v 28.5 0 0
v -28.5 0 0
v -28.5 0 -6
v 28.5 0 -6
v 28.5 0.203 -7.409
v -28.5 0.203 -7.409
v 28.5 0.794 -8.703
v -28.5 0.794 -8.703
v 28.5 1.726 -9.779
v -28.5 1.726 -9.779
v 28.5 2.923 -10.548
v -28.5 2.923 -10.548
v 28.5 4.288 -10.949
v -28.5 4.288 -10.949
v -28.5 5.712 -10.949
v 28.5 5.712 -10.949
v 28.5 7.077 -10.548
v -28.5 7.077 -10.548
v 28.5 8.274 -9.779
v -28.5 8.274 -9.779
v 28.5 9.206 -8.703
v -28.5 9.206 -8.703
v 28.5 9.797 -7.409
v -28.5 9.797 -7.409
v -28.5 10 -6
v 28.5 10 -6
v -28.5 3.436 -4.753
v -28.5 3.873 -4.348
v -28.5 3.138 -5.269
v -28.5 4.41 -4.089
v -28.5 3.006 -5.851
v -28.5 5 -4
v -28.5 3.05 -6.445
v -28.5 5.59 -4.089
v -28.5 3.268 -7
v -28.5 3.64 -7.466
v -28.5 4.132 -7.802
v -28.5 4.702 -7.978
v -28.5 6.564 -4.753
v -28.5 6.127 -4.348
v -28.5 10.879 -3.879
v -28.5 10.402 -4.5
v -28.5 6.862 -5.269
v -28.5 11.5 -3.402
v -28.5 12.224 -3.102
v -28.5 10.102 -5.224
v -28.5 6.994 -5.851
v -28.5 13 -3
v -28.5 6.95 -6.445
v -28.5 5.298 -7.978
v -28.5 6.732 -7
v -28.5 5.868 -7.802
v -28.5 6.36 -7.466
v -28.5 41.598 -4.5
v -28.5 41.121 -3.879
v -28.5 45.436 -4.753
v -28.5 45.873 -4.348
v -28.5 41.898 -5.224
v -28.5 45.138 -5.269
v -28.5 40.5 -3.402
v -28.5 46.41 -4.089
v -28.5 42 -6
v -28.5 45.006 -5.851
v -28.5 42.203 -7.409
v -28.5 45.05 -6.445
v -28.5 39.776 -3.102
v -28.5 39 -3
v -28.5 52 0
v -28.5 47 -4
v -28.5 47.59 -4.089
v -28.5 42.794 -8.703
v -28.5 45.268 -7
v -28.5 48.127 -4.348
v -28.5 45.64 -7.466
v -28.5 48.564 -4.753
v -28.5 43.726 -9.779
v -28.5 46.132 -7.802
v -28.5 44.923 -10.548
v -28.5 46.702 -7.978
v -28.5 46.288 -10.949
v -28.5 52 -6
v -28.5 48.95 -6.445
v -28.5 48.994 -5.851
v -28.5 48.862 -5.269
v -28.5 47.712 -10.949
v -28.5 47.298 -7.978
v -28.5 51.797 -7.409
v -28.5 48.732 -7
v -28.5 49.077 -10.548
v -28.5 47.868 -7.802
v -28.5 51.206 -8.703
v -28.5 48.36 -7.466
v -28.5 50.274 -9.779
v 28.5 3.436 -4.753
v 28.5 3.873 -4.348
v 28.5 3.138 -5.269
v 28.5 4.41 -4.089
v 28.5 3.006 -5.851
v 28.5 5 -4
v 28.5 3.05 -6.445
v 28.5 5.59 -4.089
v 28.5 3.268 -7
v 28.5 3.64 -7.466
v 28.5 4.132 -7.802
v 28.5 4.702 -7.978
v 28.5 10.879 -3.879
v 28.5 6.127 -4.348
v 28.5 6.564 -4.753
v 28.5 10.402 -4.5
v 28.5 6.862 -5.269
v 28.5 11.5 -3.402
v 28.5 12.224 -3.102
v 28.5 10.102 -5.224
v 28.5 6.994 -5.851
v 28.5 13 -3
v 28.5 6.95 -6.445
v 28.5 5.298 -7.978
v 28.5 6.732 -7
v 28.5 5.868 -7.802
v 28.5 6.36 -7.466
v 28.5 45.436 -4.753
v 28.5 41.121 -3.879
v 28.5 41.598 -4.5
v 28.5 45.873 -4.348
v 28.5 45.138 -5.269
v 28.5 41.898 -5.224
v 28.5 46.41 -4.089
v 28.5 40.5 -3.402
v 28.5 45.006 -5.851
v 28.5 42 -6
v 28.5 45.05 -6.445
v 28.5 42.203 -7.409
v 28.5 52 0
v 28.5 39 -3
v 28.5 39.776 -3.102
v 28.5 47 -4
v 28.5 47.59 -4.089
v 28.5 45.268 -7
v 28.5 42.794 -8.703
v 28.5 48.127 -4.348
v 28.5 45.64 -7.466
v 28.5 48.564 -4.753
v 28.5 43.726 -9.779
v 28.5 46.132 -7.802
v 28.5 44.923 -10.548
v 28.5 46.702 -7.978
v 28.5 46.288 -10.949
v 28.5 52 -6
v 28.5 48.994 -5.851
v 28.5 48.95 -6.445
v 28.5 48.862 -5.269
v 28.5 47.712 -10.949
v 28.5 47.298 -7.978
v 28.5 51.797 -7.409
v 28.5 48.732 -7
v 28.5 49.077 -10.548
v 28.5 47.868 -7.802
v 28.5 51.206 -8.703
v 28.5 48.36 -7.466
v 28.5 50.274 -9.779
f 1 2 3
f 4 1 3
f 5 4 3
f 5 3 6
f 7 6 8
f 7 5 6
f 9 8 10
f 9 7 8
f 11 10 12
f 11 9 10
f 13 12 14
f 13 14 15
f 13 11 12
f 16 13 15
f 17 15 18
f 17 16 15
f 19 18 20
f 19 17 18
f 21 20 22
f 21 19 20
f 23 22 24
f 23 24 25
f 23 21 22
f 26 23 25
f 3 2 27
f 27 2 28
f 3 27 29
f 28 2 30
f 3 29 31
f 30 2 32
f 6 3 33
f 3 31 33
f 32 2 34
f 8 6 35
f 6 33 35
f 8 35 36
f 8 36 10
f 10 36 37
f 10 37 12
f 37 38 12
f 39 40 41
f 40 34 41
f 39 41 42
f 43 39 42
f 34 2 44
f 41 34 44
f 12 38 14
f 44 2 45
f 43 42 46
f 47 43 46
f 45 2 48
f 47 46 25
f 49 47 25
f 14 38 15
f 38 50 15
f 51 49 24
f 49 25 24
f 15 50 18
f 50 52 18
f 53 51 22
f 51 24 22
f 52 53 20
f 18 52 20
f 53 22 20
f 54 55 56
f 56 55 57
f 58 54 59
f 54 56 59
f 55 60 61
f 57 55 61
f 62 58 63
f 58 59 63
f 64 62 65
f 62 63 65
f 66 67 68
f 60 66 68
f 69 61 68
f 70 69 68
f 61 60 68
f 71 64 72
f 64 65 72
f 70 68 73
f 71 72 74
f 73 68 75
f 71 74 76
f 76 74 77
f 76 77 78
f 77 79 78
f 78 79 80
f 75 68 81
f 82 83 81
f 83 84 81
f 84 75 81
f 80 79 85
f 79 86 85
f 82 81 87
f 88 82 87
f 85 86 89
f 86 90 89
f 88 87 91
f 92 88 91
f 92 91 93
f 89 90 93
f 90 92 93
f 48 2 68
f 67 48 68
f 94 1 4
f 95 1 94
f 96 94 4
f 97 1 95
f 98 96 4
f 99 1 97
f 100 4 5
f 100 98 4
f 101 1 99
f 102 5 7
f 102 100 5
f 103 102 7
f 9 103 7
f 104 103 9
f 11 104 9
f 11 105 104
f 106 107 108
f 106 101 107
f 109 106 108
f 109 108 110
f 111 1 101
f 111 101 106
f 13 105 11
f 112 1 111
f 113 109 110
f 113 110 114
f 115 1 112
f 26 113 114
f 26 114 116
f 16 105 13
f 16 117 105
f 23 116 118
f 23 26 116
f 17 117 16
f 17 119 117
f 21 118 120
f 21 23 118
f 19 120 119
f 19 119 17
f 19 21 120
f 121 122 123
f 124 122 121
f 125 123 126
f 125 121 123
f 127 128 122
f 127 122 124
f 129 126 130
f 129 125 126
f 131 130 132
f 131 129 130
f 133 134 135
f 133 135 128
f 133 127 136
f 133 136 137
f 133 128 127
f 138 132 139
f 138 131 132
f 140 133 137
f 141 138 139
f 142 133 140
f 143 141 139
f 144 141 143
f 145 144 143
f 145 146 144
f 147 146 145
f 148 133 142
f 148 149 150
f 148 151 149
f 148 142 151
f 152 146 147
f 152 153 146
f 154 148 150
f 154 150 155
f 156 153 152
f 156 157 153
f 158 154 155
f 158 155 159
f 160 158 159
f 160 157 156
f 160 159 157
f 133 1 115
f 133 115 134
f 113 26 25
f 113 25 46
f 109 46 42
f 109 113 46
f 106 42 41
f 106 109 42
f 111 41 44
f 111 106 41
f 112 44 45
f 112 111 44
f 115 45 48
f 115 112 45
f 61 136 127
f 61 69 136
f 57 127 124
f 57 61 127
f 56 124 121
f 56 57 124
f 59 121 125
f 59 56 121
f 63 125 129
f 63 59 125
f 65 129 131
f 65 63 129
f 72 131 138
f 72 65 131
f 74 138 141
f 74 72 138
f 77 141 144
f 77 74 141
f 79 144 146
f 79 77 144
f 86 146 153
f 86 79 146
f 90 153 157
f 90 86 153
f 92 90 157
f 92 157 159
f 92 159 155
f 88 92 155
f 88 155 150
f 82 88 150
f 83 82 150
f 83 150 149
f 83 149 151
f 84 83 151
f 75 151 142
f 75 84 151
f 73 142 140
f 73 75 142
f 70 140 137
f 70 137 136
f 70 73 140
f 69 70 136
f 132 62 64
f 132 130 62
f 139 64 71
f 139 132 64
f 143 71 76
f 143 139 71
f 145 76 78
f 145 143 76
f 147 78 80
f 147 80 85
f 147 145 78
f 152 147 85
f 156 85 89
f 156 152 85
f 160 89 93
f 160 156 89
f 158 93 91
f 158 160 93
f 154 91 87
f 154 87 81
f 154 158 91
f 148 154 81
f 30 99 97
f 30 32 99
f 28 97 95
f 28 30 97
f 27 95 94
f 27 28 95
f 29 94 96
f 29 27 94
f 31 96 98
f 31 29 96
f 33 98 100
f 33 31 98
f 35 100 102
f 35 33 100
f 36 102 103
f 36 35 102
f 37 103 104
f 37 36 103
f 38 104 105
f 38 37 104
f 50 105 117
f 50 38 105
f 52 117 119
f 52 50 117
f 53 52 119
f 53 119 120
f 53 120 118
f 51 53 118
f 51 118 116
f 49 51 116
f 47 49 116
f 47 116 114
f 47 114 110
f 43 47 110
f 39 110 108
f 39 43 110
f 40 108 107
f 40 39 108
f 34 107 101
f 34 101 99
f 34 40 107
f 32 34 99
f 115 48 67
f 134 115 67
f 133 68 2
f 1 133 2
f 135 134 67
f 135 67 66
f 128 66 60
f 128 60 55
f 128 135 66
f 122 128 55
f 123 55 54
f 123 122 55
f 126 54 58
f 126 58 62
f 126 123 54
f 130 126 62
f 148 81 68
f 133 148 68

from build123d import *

# Parameters (mm, degrees)
SKETCH1_R           = 2
BOSS_EXTRUDE1_DEPTH = 28.5


with BuildPart() as part:
    # Sketch1 → Boss-Extrude1 (new, symmetric)
    with BuildSketch(Plane(origin=(0, 0, 0), x_dir=(0, 0, -1), z_dir=(1, 0, 0))):
        with BuildLine():
            Line((0, 0), (6, 0))
            ThreePointArc((6, 0), (11, 5), (6, 10))
            ThreePointArc((6, 10), (3.878679656, 10.878679656), (3, 13))
            Line((3, 13), (3, 39))
            ThreePointArc((3, 39), (3.878679656, 41.121320344), (6, 42))
            ThreePointArc((6, 42), (11, 47), (6, 52))
            Line((6, 52), (0, 52))
            Line((0, 52), (0, 0))
        make_face()
        with Locations(Location((6, 5, 0), (0, 0, 180))):
            Circle(SKETCH1_R, mode=Mode.SUBTRACT)
        with Locations(Location((6, 47, 0), (0, 0, 180))):
            Circle(SKETCH1_R, mode=Mode.SUBTRACT)
    extrude(amount=BOSS_EXTRUDE1_DEPTH, both=True)


solid = part.part
